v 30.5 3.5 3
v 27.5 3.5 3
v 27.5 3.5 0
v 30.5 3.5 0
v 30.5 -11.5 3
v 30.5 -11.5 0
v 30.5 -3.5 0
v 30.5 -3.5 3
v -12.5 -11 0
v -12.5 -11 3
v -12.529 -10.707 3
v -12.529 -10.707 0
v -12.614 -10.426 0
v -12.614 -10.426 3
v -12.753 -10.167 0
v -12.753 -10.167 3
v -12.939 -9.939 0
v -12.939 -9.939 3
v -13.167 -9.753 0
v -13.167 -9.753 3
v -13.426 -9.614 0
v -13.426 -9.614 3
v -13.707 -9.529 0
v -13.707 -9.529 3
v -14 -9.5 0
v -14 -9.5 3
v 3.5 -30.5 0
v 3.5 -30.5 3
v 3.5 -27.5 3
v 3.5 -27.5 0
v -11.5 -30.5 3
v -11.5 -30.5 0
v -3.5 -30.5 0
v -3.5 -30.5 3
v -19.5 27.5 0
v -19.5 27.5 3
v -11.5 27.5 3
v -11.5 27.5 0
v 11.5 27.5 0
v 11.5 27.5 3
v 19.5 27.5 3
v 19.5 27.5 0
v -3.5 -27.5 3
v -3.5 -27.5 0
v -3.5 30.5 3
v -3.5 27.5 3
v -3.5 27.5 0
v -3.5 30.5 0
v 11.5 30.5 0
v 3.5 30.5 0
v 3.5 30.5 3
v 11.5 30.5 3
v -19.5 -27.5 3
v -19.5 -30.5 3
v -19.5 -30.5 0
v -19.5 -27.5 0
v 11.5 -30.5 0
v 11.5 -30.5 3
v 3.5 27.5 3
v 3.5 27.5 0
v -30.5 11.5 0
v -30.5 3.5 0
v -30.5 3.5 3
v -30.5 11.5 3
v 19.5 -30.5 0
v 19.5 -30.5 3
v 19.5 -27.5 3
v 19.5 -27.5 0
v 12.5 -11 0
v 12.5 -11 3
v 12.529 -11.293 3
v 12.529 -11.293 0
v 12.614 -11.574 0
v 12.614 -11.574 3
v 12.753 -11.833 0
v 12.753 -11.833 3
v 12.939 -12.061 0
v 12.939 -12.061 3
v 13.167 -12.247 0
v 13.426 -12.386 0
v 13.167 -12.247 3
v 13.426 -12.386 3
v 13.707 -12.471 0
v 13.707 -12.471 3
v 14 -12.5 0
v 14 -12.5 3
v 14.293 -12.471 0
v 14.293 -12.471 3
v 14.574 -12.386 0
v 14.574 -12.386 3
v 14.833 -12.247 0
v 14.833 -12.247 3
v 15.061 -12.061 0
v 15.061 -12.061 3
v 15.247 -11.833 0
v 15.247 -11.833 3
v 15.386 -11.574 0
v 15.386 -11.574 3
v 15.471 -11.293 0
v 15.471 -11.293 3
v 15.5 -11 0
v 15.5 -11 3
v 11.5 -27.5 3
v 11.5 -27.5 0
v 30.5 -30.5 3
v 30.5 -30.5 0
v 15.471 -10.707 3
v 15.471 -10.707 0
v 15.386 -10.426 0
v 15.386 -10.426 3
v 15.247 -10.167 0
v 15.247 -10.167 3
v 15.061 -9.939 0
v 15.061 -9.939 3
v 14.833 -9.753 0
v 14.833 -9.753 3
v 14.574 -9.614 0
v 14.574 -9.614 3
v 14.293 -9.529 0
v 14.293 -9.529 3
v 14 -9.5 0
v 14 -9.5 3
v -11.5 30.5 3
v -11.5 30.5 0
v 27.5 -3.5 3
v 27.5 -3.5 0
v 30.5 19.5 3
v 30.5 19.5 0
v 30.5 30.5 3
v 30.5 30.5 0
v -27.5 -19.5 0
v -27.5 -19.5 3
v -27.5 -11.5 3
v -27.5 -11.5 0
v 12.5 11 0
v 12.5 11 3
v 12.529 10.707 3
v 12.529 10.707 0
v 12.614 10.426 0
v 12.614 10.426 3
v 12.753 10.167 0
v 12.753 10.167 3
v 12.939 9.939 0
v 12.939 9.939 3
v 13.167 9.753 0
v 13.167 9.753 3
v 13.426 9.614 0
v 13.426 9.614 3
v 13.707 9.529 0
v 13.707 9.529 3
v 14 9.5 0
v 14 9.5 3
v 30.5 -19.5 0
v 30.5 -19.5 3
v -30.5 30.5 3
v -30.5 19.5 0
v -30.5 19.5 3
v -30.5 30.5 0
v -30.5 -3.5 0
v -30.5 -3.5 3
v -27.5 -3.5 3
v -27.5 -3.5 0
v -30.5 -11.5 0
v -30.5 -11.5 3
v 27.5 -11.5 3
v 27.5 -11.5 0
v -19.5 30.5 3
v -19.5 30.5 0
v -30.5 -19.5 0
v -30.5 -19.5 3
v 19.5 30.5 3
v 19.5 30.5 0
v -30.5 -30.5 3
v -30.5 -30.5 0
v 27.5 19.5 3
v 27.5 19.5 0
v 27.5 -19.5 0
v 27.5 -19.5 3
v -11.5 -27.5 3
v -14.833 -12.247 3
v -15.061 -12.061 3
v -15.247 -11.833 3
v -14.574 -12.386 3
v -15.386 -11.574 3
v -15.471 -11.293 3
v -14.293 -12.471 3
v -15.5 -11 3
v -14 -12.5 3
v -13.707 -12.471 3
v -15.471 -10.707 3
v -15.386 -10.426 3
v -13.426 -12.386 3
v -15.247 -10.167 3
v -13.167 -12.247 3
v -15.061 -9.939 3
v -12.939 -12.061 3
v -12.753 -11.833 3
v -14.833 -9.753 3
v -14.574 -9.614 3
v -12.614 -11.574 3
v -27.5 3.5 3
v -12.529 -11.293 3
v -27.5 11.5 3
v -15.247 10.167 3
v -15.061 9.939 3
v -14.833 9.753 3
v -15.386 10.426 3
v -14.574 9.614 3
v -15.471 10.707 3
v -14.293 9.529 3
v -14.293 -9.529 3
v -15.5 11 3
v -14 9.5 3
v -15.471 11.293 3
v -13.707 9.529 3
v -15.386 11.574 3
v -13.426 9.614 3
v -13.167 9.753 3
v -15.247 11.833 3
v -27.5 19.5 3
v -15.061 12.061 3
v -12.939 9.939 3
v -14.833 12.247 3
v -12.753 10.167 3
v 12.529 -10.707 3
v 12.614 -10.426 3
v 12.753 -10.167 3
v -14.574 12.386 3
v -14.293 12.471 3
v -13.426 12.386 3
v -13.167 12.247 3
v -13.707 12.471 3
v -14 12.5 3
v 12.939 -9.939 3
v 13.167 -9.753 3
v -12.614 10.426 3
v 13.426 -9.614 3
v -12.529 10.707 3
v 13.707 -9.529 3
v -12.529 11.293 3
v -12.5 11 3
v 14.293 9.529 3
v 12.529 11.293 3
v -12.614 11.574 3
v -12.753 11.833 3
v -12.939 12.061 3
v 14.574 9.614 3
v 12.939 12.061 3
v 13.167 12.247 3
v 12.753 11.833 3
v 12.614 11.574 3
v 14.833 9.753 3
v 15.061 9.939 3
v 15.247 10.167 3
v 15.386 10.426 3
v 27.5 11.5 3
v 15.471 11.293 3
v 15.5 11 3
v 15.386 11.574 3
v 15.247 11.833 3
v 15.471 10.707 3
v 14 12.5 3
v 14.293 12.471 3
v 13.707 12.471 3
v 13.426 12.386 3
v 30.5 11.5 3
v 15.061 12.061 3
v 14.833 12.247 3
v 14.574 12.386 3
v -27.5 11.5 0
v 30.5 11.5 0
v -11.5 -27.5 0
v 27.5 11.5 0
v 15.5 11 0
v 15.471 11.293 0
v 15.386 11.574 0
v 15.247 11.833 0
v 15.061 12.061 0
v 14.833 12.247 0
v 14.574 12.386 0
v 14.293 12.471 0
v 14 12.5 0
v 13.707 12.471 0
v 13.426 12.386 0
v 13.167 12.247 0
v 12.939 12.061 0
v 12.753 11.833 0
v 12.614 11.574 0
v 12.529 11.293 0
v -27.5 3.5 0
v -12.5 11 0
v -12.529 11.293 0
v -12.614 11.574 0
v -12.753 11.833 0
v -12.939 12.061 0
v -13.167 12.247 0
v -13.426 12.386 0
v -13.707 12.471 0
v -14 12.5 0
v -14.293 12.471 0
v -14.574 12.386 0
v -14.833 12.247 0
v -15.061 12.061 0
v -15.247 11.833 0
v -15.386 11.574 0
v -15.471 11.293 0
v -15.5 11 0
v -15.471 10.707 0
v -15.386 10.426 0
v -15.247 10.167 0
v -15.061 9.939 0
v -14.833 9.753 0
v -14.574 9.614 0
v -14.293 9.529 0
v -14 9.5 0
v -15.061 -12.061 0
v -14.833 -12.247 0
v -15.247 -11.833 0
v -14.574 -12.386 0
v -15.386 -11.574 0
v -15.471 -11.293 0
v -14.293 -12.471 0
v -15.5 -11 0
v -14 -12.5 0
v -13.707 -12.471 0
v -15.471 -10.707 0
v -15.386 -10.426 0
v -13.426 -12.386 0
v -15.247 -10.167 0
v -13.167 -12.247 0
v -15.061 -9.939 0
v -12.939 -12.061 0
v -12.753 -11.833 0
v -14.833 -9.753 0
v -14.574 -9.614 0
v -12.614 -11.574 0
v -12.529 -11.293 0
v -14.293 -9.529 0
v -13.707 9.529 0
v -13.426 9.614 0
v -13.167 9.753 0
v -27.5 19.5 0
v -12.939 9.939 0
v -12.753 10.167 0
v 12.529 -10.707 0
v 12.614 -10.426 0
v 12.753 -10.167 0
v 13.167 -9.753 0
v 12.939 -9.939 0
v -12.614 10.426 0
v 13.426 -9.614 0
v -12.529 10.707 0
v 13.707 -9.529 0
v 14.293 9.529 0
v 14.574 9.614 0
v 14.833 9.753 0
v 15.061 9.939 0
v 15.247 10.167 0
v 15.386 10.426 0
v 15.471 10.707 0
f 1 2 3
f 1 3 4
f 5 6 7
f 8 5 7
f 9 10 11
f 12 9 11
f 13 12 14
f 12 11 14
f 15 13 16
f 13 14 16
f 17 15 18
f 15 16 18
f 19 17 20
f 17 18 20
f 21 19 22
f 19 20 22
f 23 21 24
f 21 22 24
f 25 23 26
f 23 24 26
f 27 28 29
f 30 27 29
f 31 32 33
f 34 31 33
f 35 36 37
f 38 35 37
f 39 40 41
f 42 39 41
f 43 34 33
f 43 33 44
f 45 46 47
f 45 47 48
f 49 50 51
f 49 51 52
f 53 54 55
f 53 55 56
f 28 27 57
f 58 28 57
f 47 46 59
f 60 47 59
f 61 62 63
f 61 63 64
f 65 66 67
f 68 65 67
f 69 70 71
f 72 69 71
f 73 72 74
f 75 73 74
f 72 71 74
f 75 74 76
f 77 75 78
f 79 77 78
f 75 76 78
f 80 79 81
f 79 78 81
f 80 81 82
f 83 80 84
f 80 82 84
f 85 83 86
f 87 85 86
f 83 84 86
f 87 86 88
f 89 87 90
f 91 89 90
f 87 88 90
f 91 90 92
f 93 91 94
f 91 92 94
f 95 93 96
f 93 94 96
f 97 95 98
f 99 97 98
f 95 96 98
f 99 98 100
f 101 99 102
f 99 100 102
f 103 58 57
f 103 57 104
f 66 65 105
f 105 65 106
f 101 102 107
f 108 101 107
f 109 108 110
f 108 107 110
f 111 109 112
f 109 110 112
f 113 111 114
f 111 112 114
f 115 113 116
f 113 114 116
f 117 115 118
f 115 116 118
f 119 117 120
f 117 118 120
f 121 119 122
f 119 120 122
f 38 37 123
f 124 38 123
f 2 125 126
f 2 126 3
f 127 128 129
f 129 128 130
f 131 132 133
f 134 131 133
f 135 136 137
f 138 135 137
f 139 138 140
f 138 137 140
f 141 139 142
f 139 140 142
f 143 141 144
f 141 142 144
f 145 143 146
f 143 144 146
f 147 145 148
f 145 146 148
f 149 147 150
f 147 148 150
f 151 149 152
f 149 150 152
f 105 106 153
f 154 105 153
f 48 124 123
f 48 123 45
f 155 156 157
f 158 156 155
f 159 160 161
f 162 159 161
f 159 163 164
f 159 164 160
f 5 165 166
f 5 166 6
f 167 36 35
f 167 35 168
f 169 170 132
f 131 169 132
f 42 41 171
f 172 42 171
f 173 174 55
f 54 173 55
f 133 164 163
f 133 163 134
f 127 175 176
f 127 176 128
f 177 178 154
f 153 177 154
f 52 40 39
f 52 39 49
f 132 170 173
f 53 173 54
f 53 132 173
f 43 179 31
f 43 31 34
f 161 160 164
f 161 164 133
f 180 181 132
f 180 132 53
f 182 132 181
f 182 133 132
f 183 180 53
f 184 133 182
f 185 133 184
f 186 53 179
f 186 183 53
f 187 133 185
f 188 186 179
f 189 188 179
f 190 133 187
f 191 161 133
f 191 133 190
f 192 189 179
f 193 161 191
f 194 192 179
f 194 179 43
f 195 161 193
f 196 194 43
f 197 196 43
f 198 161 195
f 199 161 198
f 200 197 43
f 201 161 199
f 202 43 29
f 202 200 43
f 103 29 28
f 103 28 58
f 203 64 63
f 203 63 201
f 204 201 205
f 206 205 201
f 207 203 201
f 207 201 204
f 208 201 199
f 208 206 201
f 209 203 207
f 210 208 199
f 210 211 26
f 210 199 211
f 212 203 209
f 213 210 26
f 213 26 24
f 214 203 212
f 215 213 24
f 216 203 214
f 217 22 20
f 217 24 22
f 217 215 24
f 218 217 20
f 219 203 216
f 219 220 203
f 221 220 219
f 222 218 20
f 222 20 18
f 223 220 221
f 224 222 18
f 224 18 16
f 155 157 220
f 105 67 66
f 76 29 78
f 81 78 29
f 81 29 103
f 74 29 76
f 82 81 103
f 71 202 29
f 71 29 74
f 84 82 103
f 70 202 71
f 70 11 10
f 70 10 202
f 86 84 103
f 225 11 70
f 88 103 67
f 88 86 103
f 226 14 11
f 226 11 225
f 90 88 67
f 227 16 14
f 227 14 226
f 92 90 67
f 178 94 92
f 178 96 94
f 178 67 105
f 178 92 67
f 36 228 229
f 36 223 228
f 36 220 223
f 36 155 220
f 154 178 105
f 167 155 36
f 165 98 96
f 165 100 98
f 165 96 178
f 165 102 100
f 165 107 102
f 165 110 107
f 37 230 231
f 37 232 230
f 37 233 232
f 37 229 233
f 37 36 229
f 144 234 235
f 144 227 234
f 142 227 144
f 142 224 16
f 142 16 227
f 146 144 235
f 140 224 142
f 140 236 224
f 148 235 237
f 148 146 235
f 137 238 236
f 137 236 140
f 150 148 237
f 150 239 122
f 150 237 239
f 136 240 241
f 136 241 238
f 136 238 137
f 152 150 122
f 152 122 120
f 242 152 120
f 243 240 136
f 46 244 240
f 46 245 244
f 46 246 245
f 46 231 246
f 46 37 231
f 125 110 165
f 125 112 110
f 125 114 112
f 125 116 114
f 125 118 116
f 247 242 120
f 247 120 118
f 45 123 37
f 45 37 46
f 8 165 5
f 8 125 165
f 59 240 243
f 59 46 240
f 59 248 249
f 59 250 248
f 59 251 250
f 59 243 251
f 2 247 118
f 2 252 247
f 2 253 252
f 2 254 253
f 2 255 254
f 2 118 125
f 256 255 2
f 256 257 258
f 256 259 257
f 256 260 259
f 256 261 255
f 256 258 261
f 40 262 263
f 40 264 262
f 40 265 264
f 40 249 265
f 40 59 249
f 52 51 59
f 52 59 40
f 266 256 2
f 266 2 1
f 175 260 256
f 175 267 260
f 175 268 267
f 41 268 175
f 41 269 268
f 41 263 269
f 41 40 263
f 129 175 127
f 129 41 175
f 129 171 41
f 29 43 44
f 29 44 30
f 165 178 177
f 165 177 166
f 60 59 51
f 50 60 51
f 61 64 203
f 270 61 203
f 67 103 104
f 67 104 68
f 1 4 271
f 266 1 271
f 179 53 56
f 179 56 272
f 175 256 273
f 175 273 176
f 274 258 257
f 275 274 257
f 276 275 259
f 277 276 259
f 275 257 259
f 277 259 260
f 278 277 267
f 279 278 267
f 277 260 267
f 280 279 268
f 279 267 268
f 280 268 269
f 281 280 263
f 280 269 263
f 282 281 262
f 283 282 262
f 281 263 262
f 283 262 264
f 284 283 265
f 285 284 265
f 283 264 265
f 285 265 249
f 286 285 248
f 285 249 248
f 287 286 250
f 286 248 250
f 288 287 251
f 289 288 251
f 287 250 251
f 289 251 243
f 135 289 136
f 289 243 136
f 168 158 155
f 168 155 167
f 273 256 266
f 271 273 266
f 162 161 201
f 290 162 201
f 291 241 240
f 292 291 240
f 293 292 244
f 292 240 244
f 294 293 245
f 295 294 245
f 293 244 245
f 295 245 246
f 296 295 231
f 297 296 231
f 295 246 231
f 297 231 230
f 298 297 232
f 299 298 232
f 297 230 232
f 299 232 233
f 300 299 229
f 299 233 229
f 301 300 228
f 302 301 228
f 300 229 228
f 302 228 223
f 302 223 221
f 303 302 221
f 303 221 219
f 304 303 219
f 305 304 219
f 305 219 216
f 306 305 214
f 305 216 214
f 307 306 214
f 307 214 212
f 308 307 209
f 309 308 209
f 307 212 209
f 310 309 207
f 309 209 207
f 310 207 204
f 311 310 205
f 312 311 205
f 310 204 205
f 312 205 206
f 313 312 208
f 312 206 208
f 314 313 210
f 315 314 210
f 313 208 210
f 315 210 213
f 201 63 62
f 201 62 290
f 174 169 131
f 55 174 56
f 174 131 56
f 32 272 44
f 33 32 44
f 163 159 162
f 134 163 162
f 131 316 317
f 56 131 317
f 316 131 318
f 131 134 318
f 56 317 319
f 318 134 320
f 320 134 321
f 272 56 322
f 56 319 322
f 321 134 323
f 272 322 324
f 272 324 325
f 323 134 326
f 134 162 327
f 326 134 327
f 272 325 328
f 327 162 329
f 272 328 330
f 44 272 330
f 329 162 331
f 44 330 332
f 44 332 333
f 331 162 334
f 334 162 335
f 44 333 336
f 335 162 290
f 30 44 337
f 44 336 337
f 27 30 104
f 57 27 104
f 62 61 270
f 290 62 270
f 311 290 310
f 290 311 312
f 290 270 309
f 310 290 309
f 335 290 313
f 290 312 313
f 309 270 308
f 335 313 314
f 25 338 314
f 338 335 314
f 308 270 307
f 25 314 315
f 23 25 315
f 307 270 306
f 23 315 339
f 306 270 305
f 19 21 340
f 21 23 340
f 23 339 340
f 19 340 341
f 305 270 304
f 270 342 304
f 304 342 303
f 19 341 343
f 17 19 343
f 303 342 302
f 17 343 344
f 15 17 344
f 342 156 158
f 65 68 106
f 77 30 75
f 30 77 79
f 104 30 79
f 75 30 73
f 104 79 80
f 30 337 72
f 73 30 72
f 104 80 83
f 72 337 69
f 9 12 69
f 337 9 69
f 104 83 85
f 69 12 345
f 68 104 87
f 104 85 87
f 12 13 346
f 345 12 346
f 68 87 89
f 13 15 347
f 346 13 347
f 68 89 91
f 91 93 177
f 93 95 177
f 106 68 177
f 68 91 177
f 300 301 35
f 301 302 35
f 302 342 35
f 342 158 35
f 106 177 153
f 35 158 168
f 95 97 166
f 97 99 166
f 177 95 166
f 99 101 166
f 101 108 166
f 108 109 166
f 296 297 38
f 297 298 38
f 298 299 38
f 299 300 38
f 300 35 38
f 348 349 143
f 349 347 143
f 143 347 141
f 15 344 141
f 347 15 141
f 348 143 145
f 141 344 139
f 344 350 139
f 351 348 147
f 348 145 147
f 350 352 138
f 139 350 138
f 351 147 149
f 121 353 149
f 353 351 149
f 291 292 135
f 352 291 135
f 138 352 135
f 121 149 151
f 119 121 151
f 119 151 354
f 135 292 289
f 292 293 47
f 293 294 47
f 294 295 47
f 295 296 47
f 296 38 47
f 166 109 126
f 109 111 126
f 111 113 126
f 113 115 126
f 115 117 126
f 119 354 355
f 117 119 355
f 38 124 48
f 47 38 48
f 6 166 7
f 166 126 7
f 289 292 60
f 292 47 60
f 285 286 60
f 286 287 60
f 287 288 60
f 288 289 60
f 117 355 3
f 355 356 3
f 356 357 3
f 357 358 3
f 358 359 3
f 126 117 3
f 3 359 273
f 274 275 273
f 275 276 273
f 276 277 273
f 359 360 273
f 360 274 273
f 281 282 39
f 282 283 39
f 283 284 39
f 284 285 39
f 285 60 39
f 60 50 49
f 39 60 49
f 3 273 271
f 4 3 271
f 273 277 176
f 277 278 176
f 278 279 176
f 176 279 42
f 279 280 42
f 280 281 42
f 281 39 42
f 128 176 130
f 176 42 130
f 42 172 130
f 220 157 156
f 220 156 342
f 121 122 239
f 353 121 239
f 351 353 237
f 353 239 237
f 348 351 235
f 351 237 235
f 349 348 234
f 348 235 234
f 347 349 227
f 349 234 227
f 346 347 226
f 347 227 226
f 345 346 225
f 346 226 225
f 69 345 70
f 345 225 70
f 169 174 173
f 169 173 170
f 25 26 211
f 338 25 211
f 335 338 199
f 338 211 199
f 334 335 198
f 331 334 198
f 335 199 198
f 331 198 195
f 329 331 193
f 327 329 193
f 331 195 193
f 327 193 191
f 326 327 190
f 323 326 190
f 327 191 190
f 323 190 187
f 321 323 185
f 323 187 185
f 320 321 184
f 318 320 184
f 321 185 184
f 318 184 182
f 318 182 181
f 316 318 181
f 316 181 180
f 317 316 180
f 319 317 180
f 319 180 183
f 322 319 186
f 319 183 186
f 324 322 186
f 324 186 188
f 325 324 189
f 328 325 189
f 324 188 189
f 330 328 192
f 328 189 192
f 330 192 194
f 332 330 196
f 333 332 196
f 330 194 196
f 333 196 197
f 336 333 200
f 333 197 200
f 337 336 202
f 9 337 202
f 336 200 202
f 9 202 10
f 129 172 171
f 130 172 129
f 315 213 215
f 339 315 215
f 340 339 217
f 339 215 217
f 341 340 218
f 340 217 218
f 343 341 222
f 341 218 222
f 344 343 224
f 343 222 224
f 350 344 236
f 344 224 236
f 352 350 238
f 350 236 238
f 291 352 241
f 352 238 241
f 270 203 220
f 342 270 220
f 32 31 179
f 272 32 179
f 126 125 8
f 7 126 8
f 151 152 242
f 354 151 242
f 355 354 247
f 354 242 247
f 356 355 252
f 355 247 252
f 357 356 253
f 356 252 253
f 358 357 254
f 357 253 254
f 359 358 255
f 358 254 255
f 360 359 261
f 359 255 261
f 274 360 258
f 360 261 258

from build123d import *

# Parameters (mm, degrees)
SKETCH1_W           = 61
SKETCH1_H           = 61
BOSS_EXTRUDE1_DEPTH = 3
SKETCH2_W           = 3
SKETCH2_H           = 8
SKETCH2_H_2         = 7
SKETCH2_W_2         = 8
SKETCH2_H_3         = 3
SKETCH2_W_3         = 7
CUT_EXTRUDE1_DEPTH  = 3
CUT_EXTRUDE2_DEPTH  = 3


with BuildPart() as part:
    # Sketch1 → Boss-Extrude1 (new body)
    with BuildSketch(Plane.XY):
        Rectangle(SKETCH1_W, SKETCH1_H)
    extrude(amount=BOSS_EXTRUDE1_DEPTH)

    # Sketch2 → Cut-Extrude1 (cut)
    with BuildSketch(Plane.XY.offset(3)):
        with Locations((-29, 15.5)):
            Rectangle(SKETCH2_W, SKETCH2_H)
        with Locations((-29, 0)):
            Rectangle(SKETCH2_W, SKETCH2_H_2)
        with Locations((-29, -15.5)):
            Rectangle(SKETCH2_W, SKETCH2_H)
        with Locations((-15.5, -29)):
            Rectangle(SKETCH2_W_2, SKETCH2_H_3)
        with Locations((0, -29)):
            Rectangle(SKETCH2_W_3, SKETCH2_H_3)
        with Locations((15.5, -29)):
            Rectangle(SKETCH2_W_2, SKETCH2_H_3)
        with Locations((29, -15.5)):
            Rectangle(SKETCH2_W, SKETCH2_H)
        with Locations((29, 0)):
            Rectangle(SKETCH2_W, SKETCH2_H_2)
        with Locations((29, 15.5)):
            Rectangle(SKETCH2_W, SKETCH2_H)
        with Locations((15.5, 29)):
            Rectangle(SKETCH2_W_2, SKETCH2_H_3)
        with Locations((0, 29)):
            Rectangle(SKETCH2_W_3, SKETCH2_H_3)
        with Locations((-15.5, 29)):
            Rectangle(SKETCH2_W_2, SKETCH2_H_3)
    extrude(amount=-CUT_EXTRUDE1_DEPTH, mode=Mode.SUBTRACT)

    # Sketch3 → Cut-Extrude2 (cut)
    with BuildSketch(Plane.XY.offset(3)):
        with BuildLine():
            ThreePointArc((-12.5, 11), (-15.060660172, 12.060660172), (-14, 9.5))
            Line((-14, 9.5), (-14, 11))
            Line((-14, 11), (-12.5, 11))
        make_face()
        with BuildLine():
            Line((-14, 11), (-14, 9.5))
            ThreePointArc((-14, 9.5), (-12.939339828, 9.939339828), (-12.5, 11))
            Line((-12.5, 11), (-14, 11))
        make_face()
        with BuildLine():
            ThreePointArc((12.5, 11), (12.939339828, 9.939339828), (14, 9.5))
            Line((14, 9.5), (14, 11))
            Line((14, 11), (12.5, 11))
        make_face()
        with BuildLine():
            Line((14, 11), (14, 9.5))
            ThreePointArc((14, 9.5), (15.060660172, 9.939339828), (15.5, 11))
            ThreePointArc((15.5, 11), (14, 12.5), (12.5, 11))
            Line((12.5, 11), (14, 11))
        make_face()
        with BuildLine():
            Line((-14, -9.5), (-14, -11))
            Line((-14, -11), (-12.5, -11))
            ThreePointArc((-12.5, -11), (-12.939339828, -9.939339828), (-14, -9.5))
        make_face()
        with BuildLine():
            Line((-12.5, -11), (-14, -11))
            Line((-14, -11), (-14, -9.5))
            ThreePointArc((-14, -9.5), (-15.060660172, -12.060660172), (-12.5, -11))
        make_face()
        with BuildLine():
            ThreePointArc((14, -9.5), (12.939339828, -9.939339828), (12.5, -11))
            Line((12.5, -11), (14, -11))
            Line((14, -11), (14, -9.5))
        make_face()
        with BuildLine():
            Line((14, -11), (12.5, -11))
            ThreePointArc((12.5, -11), (14, -12.5), (15.5, -11))
            ThreePointArc((15.5, -11), (15.060660172, -9.939339828), (14, -9.5))
            Line((14, -9.5), (14, -11))
        make_face()
    extrude(amount=-CUT_EXTRUDE2_DEPTH, mode=Mode.SUBTRACT)


solid = part.part
